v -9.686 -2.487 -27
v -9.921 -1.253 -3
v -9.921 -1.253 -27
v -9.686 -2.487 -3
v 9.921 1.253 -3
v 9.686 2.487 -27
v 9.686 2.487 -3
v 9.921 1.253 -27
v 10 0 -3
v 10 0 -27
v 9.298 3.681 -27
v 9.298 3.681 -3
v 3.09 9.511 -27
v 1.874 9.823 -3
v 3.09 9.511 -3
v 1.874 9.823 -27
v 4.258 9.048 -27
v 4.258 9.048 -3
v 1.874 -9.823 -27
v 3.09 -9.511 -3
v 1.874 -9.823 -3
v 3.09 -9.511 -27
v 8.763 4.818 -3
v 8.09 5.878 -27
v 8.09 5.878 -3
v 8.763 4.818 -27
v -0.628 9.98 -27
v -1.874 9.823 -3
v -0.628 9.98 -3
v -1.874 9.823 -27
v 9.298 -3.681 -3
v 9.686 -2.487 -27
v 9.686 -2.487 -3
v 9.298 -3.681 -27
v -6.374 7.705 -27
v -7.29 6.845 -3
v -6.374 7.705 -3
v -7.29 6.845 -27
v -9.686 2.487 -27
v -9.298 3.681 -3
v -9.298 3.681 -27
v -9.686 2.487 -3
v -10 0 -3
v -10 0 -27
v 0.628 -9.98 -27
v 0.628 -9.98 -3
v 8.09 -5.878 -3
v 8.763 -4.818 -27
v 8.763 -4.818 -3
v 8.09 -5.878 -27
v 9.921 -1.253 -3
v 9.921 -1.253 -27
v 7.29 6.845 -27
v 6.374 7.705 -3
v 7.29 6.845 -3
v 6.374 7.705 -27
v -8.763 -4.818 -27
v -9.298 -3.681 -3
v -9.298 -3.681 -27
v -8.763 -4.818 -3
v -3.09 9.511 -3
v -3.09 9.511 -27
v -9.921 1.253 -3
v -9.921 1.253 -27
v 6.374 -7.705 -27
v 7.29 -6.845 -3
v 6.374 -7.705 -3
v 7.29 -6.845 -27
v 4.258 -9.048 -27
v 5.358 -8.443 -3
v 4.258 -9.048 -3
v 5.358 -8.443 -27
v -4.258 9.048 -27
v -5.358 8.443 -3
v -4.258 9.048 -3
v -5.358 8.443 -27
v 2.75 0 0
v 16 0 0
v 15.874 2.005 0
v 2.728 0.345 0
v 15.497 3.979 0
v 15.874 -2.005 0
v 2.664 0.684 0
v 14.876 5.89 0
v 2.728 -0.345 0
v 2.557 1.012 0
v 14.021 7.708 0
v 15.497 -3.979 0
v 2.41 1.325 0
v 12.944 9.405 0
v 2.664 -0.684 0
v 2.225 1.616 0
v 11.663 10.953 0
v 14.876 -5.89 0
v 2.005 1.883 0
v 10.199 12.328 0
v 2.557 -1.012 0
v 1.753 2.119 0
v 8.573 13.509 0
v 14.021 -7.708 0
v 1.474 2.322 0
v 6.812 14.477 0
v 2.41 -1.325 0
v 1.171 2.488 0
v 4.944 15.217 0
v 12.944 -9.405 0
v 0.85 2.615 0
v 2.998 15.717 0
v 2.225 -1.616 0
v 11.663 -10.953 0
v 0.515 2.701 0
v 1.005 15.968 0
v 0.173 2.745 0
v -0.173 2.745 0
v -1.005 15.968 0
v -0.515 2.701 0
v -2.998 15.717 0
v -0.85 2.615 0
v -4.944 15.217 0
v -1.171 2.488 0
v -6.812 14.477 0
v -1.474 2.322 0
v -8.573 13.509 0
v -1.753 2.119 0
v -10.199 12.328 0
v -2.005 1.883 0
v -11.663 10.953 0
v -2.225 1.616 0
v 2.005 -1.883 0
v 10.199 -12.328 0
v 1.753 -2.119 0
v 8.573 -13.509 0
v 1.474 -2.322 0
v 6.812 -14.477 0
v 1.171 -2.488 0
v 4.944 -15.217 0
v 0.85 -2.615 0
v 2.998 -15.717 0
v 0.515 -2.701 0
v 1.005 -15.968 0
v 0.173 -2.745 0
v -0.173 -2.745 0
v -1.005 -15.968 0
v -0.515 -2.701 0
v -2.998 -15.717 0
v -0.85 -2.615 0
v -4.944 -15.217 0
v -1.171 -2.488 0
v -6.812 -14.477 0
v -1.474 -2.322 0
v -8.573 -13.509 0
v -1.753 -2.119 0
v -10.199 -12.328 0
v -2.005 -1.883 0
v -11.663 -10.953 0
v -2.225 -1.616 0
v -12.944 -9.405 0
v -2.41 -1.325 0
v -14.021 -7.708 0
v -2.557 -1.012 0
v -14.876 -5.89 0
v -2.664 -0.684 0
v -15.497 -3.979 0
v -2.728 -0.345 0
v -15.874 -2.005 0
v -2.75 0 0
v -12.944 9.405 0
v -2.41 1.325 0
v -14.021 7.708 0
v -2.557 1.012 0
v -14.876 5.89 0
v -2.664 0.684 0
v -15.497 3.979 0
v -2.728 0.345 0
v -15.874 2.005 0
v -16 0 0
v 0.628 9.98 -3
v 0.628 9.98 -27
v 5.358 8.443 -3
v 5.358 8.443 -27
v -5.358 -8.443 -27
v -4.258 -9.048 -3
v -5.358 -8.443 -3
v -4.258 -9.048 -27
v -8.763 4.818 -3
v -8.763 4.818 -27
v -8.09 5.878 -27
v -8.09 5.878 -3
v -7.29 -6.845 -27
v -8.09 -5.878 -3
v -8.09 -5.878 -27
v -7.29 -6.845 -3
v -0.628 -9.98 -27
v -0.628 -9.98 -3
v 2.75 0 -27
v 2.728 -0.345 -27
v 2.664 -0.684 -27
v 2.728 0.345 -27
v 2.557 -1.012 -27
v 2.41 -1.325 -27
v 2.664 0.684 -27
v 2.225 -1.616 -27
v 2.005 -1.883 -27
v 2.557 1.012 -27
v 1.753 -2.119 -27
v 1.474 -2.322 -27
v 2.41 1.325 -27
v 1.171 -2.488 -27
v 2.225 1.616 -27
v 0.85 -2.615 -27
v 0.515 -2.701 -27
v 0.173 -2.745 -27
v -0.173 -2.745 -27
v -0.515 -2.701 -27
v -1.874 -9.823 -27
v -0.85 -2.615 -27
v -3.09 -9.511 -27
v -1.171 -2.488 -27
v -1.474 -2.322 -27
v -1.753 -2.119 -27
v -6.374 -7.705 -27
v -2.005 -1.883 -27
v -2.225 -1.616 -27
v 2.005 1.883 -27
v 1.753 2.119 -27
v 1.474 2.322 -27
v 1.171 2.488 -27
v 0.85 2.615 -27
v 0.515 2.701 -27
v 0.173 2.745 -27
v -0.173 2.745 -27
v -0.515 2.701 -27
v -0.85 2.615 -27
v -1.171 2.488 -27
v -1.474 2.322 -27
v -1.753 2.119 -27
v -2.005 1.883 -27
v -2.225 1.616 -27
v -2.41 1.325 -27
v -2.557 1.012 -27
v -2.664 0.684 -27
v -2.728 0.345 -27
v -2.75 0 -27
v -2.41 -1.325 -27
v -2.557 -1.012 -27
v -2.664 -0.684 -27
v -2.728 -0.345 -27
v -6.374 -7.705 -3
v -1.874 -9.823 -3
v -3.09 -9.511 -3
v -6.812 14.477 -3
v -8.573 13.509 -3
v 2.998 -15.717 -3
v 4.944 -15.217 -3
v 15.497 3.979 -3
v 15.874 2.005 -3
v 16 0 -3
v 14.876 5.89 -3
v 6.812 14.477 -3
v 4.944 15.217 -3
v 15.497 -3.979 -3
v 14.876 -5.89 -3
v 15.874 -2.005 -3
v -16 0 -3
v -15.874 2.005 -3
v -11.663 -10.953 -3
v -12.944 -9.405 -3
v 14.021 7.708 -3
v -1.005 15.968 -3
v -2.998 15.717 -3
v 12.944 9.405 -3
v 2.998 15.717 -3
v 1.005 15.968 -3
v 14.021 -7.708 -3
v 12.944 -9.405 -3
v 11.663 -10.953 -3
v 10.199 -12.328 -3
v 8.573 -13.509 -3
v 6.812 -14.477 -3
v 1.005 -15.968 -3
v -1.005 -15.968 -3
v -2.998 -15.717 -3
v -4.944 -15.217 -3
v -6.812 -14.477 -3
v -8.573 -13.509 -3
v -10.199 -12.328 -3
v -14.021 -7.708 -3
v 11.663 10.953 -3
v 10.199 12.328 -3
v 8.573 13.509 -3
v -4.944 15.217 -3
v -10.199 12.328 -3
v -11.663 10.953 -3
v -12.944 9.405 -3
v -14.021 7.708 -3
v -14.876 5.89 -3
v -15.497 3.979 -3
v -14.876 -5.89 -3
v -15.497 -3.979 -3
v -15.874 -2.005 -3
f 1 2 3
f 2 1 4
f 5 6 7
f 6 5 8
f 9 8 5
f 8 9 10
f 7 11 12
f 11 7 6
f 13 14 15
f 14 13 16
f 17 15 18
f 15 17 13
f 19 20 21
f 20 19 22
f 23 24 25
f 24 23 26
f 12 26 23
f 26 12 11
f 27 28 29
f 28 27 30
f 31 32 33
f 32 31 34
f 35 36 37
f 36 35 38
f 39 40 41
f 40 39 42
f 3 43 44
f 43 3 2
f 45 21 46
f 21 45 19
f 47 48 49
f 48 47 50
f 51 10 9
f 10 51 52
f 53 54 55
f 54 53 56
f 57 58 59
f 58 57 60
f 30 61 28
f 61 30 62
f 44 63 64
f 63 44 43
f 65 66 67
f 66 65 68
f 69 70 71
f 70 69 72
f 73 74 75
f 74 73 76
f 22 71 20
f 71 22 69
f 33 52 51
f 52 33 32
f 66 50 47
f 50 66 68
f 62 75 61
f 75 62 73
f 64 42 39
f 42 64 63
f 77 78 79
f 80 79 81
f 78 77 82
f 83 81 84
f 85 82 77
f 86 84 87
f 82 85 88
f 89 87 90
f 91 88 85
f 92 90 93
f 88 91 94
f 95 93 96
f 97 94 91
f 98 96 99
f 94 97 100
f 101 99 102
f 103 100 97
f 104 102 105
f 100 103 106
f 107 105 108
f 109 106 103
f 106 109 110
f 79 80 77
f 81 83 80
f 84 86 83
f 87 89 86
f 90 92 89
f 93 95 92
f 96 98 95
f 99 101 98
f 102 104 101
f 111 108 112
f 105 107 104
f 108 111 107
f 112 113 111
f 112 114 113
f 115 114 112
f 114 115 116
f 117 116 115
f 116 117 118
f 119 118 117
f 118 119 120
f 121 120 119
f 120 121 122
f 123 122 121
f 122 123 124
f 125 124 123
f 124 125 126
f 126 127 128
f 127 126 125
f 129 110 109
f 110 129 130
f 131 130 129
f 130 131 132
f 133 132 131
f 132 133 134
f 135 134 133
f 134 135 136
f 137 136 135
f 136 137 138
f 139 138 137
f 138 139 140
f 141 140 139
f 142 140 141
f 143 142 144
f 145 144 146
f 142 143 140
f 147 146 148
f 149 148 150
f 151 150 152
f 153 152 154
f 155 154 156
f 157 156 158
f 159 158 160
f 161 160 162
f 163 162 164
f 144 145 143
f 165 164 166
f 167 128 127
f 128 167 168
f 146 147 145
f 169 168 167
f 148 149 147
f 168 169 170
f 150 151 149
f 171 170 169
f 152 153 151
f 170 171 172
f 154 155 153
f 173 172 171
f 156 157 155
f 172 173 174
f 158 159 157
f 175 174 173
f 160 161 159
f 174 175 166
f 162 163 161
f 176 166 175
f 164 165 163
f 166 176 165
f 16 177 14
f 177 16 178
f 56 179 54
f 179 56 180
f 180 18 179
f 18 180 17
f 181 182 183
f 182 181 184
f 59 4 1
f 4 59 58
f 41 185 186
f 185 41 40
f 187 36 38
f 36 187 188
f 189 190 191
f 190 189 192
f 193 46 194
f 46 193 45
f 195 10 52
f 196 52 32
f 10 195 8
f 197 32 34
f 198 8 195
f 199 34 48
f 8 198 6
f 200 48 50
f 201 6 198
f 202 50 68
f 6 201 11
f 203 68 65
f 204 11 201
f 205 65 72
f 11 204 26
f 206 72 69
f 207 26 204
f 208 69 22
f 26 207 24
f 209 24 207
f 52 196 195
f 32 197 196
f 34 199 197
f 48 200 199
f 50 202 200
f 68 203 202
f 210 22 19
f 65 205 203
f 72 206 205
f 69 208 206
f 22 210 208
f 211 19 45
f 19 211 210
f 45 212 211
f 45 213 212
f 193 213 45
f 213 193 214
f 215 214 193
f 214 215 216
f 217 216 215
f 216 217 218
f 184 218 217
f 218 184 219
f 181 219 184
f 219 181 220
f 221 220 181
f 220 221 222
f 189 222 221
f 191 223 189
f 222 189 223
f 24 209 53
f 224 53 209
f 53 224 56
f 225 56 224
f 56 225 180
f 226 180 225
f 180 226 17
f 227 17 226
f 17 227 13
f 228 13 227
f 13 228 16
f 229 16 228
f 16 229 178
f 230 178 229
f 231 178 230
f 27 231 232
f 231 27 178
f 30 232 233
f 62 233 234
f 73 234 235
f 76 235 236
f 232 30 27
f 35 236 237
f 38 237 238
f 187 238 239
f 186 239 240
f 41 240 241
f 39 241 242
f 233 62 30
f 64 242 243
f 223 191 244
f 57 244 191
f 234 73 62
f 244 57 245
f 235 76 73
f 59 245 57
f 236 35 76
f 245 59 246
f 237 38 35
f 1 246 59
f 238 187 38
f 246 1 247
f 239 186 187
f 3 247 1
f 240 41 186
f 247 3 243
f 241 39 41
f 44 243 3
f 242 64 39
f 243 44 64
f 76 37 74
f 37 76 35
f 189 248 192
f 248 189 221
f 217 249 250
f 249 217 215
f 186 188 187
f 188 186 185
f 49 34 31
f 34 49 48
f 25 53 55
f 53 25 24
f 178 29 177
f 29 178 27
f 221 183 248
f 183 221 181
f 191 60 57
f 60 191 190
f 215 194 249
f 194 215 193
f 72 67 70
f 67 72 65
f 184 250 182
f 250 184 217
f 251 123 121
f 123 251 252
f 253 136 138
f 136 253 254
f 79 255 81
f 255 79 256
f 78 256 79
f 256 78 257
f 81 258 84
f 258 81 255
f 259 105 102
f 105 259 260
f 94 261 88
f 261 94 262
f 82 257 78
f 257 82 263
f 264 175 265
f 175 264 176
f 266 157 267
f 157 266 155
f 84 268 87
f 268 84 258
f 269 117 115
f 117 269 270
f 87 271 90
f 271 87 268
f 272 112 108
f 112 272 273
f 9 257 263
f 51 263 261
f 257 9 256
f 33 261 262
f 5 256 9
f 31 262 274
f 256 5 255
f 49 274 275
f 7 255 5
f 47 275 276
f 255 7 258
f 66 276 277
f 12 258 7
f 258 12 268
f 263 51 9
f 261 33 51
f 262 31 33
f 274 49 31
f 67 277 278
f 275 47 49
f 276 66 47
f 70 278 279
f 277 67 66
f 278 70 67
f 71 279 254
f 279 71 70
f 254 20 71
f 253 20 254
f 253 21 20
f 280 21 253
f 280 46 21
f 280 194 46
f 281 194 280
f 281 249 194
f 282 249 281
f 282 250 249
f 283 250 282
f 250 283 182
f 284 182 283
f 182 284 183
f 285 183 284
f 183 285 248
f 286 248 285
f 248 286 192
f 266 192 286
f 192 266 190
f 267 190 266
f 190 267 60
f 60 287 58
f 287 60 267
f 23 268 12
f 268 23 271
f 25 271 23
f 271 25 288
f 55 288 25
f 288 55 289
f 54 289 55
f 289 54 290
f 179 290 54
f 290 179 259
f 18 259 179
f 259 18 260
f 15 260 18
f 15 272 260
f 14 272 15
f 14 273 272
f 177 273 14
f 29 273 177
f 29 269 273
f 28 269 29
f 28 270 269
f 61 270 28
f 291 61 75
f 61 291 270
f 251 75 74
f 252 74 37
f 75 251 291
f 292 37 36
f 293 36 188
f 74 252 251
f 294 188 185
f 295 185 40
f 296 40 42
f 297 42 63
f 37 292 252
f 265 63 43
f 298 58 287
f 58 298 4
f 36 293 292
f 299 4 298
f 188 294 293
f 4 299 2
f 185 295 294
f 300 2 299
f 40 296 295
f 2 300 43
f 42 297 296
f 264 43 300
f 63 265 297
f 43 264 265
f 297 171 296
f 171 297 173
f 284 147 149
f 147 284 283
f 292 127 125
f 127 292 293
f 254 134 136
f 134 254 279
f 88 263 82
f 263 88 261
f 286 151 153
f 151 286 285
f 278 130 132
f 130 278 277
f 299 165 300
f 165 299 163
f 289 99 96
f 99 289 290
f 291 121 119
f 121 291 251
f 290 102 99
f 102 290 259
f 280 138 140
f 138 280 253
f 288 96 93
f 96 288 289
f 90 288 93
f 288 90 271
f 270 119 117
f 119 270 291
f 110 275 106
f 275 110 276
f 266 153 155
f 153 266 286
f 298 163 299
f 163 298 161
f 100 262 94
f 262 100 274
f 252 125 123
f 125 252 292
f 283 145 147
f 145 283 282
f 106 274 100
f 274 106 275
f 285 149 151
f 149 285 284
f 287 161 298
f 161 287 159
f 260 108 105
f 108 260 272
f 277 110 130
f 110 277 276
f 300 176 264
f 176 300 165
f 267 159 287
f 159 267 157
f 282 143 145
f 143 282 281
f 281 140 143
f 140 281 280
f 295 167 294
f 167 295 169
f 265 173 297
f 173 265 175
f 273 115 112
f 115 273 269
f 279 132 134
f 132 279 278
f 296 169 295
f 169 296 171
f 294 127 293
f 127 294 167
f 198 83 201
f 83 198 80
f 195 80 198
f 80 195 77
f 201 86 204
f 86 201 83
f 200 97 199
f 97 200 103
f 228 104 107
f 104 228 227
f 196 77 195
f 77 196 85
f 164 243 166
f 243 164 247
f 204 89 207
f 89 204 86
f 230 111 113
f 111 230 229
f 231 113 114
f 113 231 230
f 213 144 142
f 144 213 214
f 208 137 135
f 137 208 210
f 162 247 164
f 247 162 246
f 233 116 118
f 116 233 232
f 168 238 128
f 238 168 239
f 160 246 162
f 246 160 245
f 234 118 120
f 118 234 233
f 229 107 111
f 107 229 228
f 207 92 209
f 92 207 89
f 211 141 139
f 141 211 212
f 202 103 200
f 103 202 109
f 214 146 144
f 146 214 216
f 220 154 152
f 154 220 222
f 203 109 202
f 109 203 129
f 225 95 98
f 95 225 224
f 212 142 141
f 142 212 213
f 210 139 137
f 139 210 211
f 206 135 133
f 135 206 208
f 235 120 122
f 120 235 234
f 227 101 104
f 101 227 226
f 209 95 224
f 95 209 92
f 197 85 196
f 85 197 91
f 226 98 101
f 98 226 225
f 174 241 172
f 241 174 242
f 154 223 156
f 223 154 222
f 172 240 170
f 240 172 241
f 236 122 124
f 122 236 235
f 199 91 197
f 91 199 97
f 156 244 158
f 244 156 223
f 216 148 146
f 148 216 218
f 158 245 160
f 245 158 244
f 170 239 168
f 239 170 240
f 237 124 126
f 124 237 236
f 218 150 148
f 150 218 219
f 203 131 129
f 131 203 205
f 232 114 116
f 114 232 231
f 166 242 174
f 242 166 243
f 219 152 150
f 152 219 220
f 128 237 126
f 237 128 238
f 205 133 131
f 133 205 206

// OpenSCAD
$fn = 50;


difference() {
	union() {
		translate(v = [0, 0, -27.0000000000]) {
			cylinder(h = 27, r = 10.0000000000);
		}
		translate(v = [0, 0, -3.0000000000]) {
			cylinder(h = 3, r = 16.0000000000);
		}
	}
	union() {
		#translate(v = [0, 0, -27]) {
			cylinder(h = 27, r = 2.7500000000);
		}
	}
}
